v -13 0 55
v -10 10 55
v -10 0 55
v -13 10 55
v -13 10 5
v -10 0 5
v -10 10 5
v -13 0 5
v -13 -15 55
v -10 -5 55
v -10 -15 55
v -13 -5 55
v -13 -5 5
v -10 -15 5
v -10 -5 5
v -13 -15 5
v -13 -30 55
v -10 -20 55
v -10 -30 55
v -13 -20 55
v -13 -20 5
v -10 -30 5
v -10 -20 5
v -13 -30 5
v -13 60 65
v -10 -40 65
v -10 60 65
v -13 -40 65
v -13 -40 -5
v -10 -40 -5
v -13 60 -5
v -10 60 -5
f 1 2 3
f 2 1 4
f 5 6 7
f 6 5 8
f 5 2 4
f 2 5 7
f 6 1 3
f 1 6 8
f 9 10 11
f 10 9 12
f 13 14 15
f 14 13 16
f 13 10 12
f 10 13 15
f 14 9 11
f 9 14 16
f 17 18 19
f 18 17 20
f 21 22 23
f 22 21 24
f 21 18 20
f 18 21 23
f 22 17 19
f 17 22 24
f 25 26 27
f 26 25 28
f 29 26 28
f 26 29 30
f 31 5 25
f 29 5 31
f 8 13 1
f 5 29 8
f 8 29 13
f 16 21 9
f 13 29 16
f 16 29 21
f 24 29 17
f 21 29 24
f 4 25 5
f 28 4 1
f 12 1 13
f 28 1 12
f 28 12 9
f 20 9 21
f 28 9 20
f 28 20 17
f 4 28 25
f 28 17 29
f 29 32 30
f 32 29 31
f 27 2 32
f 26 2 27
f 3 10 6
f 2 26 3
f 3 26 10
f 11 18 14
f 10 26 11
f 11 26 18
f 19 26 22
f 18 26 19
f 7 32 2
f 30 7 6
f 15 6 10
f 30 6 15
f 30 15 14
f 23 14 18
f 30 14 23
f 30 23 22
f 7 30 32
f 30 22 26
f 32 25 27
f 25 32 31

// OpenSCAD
module door(){
	difference(){
		translate([-10, -40, -5]) rotate([0, 0, 90])
			cube([100, 3, 70]);

		for(i= [0:2])
		{
		translate([-15, -i*15, 5])
			cube([10, 10, 50]);
		}
	}
}

door();
